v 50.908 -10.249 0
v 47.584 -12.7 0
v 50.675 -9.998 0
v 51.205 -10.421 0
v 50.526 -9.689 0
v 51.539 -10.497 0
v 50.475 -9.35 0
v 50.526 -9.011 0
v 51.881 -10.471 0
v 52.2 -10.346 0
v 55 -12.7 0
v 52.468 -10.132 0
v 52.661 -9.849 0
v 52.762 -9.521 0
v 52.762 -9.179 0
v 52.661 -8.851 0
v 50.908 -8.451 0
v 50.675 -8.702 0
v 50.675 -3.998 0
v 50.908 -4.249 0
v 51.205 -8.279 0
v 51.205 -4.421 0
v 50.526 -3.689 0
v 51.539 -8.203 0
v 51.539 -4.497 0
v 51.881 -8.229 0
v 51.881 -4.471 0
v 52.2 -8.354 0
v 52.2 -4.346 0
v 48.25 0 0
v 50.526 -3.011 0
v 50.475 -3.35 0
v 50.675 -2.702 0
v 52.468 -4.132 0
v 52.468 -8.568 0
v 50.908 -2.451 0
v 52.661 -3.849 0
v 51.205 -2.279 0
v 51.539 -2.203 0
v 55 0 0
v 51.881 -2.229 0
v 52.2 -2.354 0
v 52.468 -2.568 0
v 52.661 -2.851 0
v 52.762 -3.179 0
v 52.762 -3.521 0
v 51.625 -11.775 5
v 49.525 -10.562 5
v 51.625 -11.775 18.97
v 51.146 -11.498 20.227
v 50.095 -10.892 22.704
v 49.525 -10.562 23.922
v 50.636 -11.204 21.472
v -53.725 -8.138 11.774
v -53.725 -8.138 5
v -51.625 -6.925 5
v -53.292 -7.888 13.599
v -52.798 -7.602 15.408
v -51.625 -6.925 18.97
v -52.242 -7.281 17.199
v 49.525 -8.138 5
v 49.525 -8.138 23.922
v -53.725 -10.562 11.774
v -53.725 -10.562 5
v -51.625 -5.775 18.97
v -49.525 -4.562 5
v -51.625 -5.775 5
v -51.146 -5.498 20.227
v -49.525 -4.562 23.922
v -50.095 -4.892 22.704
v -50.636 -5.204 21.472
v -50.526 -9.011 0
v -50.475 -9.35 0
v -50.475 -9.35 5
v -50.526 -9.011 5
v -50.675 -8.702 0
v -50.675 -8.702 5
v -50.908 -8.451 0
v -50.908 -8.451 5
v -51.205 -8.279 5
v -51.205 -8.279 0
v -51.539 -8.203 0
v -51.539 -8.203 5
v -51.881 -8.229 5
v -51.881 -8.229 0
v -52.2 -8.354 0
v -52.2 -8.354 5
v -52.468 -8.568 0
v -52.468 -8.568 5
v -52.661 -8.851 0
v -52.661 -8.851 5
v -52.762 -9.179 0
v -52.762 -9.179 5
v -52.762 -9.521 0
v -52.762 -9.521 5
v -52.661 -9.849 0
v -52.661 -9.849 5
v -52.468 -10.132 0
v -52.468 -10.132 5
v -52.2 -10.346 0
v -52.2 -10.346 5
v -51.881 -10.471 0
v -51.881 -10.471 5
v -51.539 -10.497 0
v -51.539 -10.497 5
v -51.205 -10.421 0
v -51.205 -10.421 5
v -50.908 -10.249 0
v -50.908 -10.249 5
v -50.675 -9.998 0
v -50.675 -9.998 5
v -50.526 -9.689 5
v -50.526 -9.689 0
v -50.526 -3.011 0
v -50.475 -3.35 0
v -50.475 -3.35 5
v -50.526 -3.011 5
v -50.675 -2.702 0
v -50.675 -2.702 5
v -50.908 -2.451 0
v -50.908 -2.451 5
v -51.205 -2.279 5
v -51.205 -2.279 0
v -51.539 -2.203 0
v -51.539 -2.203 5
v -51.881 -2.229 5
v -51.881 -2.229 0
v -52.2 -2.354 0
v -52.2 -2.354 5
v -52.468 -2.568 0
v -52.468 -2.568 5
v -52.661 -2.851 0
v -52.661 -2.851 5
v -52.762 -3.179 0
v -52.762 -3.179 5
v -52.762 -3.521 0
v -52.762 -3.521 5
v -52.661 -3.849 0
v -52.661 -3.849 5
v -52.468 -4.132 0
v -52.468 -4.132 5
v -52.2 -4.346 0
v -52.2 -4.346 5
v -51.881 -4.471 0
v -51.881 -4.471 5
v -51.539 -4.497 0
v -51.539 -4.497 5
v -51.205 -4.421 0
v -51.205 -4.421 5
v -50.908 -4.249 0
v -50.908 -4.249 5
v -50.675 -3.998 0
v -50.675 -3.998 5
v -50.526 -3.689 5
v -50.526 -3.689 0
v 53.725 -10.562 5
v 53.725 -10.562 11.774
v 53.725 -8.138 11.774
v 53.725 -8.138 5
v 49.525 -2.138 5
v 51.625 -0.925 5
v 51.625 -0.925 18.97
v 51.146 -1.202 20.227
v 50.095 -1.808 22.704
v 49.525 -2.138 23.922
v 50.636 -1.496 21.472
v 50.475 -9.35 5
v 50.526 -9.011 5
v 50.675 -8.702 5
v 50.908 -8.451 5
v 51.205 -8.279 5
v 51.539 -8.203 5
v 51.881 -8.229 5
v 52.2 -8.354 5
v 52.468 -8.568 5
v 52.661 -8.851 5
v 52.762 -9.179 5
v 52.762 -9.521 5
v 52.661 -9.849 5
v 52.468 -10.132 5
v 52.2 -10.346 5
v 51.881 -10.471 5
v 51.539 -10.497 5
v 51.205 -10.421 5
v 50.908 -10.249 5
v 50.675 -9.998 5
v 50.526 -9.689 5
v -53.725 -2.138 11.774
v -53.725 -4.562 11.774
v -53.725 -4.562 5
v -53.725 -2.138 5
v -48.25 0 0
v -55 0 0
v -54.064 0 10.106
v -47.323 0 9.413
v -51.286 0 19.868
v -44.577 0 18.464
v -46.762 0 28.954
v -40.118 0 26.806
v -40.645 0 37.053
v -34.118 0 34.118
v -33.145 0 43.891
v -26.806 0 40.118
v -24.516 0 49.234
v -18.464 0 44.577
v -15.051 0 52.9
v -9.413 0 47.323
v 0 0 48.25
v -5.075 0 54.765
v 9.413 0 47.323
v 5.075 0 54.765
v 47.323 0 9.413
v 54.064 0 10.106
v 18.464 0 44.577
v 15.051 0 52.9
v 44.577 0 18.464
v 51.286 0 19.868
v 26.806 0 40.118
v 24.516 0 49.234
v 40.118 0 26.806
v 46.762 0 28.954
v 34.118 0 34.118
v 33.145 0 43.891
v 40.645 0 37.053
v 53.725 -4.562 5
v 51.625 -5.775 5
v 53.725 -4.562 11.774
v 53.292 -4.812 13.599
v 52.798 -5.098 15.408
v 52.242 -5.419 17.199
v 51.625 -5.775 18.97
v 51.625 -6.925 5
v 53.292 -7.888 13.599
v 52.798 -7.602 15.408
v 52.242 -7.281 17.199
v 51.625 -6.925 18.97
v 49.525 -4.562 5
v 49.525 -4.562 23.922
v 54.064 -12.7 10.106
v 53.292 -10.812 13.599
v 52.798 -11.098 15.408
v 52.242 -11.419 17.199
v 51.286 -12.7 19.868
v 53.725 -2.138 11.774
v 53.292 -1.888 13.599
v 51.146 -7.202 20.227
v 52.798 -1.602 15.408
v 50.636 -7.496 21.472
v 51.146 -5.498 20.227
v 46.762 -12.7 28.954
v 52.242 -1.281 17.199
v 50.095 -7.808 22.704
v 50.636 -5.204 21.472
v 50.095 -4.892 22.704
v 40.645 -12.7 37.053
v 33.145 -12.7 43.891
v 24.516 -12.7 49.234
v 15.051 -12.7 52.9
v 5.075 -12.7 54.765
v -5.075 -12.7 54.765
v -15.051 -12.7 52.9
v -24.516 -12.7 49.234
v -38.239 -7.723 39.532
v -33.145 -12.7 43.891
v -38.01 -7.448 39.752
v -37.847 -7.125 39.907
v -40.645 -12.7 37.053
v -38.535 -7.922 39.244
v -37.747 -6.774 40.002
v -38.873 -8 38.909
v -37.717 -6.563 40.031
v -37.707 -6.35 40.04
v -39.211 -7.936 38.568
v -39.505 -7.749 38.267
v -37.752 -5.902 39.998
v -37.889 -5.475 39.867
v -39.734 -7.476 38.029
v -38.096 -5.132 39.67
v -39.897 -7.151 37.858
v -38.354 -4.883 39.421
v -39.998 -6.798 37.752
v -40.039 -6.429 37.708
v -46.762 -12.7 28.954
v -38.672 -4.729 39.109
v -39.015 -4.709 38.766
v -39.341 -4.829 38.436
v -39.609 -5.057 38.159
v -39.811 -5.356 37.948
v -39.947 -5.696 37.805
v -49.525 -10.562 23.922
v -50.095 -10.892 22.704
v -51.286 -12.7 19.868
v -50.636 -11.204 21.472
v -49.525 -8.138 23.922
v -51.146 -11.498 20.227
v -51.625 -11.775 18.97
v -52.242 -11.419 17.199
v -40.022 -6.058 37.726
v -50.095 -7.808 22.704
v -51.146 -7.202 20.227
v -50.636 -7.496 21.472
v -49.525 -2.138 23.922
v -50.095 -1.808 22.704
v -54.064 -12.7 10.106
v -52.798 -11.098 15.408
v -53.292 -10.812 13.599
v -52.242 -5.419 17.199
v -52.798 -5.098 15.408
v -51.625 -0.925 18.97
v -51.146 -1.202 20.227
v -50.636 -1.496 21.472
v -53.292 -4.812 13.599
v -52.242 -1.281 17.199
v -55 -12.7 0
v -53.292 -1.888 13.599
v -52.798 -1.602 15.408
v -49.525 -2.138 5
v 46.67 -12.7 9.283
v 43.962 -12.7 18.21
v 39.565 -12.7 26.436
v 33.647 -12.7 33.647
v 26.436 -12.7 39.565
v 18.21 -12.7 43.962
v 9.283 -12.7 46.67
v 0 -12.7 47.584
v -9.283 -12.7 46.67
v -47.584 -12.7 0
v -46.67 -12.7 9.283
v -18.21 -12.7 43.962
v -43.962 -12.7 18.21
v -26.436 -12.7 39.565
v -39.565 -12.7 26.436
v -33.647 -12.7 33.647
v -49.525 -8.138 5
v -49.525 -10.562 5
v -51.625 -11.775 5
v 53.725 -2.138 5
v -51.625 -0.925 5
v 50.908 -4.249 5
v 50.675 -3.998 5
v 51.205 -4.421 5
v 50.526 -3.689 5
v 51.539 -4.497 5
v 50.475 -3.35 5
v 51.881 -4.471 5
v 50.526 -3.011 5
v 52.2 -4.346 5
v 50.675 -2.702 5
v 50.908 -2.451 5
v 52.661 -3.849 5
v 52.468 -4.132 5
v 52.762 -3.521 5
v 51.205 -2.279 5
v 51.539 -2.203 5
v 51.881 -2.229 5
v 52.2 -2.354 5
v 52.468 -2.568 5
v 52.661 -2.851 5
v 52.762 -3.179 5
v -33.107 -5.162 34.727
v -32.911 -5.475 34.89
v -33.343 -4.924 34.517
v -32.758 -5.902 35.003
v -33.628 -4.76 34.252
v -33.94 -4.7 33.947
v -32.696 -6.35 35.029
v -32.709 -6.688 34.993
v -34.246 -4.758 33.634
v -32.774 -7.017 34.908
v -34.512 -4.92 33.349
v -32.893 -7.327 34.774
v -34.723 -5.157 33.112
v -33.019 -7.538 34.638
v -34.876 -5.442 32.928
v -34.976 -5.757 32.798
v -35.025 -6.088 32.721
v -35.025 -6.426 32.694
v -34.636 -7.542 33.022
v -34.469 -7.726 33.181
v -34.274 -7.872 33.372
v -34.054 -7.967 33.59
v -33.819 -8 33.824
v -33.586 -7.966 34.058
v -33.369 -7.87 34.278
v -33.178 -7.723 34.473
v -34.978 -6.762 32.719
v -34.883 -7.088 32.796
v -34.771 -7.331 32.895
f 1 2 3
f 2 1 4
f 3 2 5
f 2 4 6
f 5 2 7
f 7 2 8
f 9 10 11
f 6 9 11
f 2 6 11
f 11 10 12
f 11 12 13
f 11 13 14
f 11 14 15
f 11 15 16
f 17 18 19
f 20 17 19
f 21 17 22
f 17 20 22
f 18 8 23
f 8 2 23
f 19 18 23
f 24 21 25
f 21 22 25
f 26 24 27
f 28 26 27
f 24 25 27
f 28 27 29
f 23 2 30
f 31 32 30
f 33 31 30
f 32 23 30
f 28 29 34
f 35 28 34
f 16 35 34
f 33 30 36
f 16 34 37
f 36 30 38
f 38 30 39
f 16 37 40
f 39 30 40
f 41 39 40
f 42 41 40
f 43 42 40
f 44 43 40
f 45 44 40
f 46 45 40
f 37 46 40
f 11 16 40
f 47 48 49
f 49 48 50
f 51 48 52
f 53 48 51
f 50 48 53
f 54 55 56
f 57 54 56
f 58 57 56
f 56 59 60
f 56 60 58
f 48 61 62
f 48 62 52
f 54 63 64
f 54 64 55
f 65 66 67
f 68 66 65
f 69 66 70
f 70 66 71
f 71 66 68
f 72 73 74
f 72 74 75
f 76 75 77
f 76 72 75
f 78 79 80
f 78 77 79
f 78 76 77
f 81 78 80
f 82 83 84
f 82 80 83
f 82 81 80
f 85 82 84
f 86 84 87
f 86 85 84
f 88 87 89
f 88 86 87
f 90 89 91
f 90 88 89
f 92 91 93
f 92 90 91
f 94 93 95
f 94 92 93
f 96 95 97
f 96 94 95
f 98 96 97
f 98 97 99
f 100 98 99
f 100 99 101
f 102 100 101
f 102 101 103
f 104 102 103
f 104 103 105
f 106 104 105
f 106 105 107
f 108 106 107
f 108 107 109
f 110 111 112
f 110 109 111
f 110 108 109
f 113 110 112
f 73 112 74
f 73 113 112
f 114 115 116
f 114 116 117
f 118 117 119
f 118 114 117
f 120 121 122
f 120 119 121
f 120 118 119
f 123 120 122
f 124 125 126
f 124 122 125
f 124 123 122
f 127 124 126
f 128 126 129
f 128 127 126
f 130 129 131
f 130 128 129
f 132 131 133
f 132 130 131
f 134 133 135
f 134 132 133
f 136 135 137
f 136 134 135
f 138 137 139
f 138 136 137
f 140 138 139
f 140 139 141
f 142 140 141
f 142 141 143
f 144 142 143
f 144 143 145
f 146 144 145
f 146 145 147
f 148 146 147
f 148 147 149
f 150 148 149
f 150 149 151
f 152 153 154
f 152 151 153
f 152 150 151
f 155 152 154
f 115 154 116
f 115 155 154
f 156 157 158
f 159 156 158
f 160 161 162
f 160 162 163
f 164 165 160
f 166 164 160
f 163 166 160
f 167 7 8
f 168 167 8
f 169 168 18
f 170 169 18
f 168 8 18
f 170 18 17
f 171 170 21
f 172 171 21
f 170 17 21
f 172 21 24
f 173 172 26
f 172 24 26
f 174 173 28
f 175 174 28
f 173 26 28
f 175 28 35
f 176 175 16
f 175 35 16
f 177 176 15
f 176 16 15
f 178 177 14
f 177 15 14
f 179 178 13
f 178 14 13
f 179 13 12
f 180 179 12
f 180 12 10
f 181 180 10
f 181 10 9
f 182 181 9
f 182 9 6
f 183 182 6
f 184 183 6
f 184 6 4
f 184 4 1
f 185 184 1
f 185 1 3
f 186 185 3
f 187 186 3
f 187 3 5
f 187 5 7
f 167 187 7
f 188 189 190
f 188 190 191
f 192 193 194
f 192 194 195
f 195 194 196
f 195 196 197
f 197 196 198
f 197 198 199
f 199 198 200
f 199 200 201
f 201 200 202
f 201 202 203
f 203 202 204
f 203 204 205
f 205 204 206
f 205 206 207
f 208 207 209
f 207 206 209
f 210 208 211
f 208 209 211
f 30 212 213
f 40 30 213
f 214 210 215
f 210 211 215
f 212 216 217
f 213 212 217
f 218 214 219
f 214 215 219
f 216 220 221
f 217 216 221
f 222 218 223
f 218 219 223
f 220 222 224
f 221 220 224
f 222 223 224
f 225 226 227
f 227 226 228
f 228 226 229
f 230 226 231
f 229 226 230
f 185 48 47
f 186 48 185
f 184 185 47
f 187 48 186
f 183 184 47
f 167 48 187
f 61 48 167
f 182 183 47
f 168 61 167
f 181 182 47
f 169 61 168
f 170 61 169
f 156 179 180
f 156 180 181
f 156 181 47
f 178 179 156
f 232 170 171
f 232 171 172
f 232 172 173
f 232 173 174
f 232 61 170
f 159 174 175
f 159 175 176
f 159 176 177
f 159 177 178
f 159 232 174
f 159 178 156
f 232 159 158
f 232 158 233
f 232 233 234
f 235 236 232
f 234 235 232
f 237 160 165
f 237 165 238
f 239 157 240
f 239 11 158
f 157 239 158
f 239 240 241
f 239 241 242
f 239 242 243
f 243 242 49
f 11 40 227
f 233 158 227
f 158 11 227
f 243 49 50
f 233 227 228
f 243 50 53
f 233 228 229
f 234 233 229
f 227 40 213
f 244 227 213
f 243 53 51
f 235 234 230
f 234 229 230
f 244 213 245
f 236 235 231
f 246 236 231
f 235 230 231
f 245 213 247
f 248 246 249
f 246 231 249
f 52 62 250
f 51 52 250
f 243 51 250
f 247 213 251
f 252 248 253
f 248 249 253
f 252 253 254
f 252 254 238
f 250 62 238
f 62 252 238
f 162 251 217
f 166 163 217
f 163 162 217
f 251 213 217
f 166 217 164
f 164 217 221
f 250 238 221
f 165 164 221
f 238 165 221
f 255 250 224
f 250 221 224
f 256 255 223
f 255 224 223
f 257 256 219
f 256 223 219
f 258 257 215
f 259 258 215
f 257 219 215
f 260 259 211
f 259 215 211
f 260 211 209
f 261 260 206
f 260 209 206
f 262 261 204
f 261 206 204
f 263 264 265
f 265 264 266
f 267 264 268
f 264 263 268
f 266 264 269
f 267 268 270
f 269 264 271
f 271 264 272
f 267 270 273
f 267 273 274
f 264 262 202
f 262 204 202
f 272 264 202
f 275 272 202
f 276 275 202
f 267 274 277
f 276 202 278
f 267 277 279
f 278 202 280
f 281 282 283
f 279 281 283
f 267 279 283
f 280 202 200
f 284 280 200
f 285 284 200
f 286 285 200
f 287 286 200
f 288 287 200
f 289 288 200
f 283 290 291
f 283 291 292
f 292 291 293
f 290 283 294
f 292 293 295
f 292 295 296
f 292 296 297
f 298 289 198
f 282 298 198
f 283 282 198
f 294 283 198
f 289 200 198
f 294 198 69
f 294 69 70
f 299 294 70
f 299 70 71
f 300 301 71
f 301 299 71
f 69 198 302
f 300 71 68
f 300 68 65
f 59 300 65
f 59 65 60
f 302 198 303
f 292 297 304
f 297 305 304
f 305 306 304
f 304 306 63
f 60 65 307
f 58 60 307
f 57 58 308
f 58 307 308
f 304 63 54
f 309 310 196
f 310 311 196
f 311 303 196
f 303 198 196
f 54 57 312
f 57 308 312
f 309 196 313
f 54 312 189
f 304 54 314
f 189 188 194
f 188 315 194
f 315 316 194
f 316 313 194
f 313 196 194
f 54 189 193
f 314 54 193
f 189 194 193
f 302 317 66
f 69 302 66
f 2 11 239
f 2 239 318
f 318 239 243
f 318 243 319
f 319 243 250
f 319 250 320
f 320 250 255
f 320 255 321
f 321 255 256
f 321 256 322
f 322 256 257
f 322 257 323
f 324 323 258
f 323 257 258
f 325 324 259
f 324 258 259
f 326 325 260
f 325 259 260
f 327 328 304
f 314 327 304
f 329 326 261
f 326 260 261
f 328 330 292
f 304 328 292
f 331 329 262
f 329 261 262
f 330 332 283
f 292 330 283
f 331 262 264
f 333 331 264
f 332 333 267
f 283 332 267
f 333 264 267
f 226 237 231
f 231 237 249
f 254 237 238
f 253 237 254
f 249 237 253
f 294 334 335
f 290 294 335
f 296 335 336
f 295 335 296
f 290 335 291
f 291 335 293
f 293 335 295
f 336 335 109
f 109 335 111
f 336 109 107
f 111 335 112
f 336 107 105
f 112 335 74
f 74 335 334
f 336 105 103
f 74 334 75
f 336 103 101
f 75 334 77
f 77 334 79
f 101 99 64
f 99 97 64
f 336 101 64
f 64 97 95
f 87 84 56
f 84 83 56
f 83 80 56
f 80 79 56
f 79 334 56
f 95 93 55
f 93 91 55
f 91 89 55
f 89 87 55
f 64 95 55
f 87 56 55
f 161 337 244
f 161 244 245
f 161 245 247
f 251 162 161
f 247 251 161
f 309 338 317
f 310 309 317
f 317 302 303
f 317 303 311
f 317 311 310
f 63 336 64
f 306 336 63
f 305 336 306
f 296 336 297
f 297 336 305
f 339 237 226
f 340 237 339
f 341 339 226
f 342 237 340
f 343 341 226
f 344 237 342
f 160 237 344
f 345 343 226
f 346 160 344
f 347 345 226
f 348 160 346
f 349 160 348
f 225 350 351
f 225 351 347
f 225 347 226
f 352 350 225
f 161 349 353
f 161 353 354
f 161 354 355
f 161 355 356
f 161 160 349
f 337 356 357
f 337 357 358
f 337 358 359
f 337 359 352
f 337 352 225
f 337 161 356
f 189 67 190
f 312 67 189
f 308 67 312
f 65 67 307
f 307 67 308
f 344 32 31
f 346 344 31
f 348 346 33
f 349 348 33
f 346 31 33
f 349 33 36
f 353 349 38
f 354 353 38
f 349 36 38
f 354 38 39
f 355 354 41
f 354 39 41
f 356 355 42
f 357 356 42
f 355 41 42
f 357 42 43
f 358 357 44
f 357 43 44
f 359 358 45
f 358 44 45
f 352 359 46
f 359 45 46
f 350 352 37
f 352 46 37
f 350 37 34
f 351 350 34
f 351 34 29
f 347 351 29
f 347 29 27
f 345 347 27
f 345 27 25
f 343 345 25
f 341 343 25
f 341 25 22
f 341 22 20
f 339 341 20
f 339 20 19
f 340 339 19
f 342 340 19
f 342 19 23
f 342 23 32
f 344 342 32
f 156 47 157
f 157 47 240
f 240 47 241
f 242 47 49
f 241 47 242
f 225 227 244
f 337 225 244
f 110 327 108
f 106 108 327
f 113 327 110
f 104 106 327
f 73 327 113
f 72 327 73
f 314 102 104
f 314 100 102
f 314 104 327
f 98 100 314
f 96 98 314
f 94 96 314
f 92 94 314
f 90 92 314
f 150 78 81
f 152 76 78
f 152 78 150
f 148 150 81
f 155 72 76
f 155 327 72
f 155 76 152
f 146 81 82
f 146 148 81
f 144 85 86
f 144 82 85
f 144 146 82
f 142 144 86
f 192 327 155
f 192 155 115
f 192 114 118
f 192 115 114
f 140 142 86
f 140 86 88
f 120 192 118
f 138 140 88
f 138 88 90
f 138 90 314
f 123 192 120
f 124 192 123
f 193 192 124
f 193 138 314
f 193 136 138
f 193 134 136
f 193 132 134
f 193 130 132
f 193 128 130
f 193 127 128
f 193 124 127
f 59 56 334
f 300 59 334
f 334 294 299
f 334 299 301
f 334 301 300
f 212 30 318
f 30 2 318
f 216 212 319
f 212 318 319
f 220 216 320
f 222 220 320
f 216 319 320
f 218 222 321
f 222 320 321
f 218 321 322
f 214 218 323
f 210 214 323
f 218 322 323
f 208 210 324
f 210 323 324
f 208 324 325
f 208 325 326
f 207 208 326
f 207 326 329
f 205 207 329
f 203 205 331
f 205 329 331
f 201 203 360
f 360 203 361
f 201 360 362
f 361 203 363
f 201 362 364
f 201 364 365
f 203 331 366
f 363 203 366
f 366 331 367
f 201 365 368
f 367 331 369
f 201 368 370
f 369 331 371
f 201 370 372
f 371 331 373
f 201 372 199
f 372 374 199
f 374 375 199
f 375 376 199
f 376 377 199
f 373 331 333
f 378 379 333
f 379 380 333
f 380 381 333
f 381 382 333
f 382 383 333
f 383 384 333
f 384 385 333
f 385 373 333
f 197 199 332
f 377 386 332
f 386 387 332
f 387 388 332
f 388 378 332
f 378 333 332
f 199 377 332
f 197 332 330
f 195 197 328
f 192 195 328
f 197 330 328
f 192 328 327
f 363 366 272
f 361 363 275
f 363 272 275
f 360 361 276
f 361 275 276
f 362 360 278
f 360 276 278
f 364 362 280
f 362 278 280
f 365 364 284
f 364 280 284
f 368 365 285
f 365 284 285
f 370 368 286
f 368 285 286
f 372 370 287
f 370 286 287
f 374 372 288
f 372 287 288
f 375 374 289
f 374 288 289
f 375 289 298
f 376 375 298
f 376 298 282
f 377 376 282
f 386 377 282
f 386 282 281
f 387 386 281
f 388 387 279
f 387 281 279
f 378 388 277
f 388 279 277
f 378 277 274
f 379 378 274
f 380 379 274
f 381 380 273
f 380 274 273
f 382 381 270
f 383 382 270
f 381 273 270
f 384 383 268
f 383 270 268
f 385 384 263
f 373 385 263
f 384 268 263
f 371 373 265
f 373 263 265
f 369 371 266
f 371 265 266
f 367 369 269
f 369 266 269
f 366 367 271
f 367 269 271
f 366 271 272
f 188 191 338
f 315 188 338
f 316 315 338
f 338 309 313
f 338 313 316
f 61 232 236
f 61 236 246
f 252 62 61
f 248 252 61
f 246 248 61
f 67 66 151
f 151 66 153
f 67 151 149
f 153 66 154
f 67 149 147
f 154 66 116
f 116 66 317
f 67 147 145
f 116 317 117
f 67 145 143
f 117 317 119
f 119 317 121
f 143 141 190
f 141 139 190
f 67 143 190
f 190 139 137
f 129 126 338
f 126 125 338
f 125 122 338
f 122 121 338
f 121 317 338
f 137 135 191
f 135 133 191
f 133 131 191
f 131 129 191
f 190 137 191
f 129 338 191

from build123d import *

# Parameters (mm, degrees)
REVOLVE2_ANGLE        = 180
CUT_EXTRUDE1_DEPTH    = 50
F_2_0MM_DOWEL_HOLE1_D = 2.3
SKETCH13_R            = 1.65
CUT_EXTRUDE2_DEPTH    = 100


with BuildPart() as part:
    # Sketch3 → Revolve2 (revolve)
    with BuildSketch(Plane.XY):
        Polygon((48.25, 0), (47.584421203, -12.7), (55, -12.7), (55, 0), align=None)
    revolve(axis=Axis((0, 50.355486862, 0), (0, -1, 0)), revolution_arc=REVOLVE2_ANGLE)

    # Sketch9 → Cut-Extrude1 (cut)
    with BuildSketch(Plane.XY.offset(55)):
        Polygon((53.725, -4.562435565), (53.725, -2.137564435), (51.625, -0.925128869), (49.525, -2.137564435), (49.525, -4.562435565), (51.625, -5.774871131), align=None)
        Polygon((53.725, -10.562435565), (53.725, -8.137564435), (51.625, -6.925128869), (49.525, -8.137564435), (49.525, -10.562435565), (51.625, -11.774871131), align=None)
    cut_extrude1 = extrude(amount=-CUT_EXTRUDE1_DEPTH, mode=Mode.SUBTRACT)

    # Ø2.0mm Dowel Hole1 (through all)
    with Locations(Plane.XY.offset(5)):
        with Locations((51.625, -9.35), (51.625, -3.35)):
            f_2_0mm_dowel_hole1 = Hole(F_2_0MM_DOWEL_HOLE1_D / 2)

    # Mirror2: Cut-Extrude1, Ø2.0mm Dowel Hole1 across plane
    add(cut_extrude1.mirror(Plane(origin=(0, 0, 0), x_dir=(0, 0, 1), z_dir=(1, 0, 0))), mode=Mode.SUBTRACT)
    add(f_2_0mm_dowel_hole1.mirror(Plane(origin=(0, 0, 0), x_dir=(0, 0, 1), z_dir=(1, 0, 0))), mode=Mode.SUBTRACT)

    # Sketch13 → Cut-Extrude2 (cut, symmetric)
    with BuildSketch(Plane(origin=(0, 0, 0), x_dir=(0.707106781, 0, 0.707106781), z_dir=(-0.707106781, 0, 0.707106781))):
        with Locations((0, -6.35)):
            Circle(SKETCH13_R)
    extrude(amount=CUT_EXTRUDE2_DEPTH, both=True, mode=Mode.SUBTRACT)


solid = part.part
